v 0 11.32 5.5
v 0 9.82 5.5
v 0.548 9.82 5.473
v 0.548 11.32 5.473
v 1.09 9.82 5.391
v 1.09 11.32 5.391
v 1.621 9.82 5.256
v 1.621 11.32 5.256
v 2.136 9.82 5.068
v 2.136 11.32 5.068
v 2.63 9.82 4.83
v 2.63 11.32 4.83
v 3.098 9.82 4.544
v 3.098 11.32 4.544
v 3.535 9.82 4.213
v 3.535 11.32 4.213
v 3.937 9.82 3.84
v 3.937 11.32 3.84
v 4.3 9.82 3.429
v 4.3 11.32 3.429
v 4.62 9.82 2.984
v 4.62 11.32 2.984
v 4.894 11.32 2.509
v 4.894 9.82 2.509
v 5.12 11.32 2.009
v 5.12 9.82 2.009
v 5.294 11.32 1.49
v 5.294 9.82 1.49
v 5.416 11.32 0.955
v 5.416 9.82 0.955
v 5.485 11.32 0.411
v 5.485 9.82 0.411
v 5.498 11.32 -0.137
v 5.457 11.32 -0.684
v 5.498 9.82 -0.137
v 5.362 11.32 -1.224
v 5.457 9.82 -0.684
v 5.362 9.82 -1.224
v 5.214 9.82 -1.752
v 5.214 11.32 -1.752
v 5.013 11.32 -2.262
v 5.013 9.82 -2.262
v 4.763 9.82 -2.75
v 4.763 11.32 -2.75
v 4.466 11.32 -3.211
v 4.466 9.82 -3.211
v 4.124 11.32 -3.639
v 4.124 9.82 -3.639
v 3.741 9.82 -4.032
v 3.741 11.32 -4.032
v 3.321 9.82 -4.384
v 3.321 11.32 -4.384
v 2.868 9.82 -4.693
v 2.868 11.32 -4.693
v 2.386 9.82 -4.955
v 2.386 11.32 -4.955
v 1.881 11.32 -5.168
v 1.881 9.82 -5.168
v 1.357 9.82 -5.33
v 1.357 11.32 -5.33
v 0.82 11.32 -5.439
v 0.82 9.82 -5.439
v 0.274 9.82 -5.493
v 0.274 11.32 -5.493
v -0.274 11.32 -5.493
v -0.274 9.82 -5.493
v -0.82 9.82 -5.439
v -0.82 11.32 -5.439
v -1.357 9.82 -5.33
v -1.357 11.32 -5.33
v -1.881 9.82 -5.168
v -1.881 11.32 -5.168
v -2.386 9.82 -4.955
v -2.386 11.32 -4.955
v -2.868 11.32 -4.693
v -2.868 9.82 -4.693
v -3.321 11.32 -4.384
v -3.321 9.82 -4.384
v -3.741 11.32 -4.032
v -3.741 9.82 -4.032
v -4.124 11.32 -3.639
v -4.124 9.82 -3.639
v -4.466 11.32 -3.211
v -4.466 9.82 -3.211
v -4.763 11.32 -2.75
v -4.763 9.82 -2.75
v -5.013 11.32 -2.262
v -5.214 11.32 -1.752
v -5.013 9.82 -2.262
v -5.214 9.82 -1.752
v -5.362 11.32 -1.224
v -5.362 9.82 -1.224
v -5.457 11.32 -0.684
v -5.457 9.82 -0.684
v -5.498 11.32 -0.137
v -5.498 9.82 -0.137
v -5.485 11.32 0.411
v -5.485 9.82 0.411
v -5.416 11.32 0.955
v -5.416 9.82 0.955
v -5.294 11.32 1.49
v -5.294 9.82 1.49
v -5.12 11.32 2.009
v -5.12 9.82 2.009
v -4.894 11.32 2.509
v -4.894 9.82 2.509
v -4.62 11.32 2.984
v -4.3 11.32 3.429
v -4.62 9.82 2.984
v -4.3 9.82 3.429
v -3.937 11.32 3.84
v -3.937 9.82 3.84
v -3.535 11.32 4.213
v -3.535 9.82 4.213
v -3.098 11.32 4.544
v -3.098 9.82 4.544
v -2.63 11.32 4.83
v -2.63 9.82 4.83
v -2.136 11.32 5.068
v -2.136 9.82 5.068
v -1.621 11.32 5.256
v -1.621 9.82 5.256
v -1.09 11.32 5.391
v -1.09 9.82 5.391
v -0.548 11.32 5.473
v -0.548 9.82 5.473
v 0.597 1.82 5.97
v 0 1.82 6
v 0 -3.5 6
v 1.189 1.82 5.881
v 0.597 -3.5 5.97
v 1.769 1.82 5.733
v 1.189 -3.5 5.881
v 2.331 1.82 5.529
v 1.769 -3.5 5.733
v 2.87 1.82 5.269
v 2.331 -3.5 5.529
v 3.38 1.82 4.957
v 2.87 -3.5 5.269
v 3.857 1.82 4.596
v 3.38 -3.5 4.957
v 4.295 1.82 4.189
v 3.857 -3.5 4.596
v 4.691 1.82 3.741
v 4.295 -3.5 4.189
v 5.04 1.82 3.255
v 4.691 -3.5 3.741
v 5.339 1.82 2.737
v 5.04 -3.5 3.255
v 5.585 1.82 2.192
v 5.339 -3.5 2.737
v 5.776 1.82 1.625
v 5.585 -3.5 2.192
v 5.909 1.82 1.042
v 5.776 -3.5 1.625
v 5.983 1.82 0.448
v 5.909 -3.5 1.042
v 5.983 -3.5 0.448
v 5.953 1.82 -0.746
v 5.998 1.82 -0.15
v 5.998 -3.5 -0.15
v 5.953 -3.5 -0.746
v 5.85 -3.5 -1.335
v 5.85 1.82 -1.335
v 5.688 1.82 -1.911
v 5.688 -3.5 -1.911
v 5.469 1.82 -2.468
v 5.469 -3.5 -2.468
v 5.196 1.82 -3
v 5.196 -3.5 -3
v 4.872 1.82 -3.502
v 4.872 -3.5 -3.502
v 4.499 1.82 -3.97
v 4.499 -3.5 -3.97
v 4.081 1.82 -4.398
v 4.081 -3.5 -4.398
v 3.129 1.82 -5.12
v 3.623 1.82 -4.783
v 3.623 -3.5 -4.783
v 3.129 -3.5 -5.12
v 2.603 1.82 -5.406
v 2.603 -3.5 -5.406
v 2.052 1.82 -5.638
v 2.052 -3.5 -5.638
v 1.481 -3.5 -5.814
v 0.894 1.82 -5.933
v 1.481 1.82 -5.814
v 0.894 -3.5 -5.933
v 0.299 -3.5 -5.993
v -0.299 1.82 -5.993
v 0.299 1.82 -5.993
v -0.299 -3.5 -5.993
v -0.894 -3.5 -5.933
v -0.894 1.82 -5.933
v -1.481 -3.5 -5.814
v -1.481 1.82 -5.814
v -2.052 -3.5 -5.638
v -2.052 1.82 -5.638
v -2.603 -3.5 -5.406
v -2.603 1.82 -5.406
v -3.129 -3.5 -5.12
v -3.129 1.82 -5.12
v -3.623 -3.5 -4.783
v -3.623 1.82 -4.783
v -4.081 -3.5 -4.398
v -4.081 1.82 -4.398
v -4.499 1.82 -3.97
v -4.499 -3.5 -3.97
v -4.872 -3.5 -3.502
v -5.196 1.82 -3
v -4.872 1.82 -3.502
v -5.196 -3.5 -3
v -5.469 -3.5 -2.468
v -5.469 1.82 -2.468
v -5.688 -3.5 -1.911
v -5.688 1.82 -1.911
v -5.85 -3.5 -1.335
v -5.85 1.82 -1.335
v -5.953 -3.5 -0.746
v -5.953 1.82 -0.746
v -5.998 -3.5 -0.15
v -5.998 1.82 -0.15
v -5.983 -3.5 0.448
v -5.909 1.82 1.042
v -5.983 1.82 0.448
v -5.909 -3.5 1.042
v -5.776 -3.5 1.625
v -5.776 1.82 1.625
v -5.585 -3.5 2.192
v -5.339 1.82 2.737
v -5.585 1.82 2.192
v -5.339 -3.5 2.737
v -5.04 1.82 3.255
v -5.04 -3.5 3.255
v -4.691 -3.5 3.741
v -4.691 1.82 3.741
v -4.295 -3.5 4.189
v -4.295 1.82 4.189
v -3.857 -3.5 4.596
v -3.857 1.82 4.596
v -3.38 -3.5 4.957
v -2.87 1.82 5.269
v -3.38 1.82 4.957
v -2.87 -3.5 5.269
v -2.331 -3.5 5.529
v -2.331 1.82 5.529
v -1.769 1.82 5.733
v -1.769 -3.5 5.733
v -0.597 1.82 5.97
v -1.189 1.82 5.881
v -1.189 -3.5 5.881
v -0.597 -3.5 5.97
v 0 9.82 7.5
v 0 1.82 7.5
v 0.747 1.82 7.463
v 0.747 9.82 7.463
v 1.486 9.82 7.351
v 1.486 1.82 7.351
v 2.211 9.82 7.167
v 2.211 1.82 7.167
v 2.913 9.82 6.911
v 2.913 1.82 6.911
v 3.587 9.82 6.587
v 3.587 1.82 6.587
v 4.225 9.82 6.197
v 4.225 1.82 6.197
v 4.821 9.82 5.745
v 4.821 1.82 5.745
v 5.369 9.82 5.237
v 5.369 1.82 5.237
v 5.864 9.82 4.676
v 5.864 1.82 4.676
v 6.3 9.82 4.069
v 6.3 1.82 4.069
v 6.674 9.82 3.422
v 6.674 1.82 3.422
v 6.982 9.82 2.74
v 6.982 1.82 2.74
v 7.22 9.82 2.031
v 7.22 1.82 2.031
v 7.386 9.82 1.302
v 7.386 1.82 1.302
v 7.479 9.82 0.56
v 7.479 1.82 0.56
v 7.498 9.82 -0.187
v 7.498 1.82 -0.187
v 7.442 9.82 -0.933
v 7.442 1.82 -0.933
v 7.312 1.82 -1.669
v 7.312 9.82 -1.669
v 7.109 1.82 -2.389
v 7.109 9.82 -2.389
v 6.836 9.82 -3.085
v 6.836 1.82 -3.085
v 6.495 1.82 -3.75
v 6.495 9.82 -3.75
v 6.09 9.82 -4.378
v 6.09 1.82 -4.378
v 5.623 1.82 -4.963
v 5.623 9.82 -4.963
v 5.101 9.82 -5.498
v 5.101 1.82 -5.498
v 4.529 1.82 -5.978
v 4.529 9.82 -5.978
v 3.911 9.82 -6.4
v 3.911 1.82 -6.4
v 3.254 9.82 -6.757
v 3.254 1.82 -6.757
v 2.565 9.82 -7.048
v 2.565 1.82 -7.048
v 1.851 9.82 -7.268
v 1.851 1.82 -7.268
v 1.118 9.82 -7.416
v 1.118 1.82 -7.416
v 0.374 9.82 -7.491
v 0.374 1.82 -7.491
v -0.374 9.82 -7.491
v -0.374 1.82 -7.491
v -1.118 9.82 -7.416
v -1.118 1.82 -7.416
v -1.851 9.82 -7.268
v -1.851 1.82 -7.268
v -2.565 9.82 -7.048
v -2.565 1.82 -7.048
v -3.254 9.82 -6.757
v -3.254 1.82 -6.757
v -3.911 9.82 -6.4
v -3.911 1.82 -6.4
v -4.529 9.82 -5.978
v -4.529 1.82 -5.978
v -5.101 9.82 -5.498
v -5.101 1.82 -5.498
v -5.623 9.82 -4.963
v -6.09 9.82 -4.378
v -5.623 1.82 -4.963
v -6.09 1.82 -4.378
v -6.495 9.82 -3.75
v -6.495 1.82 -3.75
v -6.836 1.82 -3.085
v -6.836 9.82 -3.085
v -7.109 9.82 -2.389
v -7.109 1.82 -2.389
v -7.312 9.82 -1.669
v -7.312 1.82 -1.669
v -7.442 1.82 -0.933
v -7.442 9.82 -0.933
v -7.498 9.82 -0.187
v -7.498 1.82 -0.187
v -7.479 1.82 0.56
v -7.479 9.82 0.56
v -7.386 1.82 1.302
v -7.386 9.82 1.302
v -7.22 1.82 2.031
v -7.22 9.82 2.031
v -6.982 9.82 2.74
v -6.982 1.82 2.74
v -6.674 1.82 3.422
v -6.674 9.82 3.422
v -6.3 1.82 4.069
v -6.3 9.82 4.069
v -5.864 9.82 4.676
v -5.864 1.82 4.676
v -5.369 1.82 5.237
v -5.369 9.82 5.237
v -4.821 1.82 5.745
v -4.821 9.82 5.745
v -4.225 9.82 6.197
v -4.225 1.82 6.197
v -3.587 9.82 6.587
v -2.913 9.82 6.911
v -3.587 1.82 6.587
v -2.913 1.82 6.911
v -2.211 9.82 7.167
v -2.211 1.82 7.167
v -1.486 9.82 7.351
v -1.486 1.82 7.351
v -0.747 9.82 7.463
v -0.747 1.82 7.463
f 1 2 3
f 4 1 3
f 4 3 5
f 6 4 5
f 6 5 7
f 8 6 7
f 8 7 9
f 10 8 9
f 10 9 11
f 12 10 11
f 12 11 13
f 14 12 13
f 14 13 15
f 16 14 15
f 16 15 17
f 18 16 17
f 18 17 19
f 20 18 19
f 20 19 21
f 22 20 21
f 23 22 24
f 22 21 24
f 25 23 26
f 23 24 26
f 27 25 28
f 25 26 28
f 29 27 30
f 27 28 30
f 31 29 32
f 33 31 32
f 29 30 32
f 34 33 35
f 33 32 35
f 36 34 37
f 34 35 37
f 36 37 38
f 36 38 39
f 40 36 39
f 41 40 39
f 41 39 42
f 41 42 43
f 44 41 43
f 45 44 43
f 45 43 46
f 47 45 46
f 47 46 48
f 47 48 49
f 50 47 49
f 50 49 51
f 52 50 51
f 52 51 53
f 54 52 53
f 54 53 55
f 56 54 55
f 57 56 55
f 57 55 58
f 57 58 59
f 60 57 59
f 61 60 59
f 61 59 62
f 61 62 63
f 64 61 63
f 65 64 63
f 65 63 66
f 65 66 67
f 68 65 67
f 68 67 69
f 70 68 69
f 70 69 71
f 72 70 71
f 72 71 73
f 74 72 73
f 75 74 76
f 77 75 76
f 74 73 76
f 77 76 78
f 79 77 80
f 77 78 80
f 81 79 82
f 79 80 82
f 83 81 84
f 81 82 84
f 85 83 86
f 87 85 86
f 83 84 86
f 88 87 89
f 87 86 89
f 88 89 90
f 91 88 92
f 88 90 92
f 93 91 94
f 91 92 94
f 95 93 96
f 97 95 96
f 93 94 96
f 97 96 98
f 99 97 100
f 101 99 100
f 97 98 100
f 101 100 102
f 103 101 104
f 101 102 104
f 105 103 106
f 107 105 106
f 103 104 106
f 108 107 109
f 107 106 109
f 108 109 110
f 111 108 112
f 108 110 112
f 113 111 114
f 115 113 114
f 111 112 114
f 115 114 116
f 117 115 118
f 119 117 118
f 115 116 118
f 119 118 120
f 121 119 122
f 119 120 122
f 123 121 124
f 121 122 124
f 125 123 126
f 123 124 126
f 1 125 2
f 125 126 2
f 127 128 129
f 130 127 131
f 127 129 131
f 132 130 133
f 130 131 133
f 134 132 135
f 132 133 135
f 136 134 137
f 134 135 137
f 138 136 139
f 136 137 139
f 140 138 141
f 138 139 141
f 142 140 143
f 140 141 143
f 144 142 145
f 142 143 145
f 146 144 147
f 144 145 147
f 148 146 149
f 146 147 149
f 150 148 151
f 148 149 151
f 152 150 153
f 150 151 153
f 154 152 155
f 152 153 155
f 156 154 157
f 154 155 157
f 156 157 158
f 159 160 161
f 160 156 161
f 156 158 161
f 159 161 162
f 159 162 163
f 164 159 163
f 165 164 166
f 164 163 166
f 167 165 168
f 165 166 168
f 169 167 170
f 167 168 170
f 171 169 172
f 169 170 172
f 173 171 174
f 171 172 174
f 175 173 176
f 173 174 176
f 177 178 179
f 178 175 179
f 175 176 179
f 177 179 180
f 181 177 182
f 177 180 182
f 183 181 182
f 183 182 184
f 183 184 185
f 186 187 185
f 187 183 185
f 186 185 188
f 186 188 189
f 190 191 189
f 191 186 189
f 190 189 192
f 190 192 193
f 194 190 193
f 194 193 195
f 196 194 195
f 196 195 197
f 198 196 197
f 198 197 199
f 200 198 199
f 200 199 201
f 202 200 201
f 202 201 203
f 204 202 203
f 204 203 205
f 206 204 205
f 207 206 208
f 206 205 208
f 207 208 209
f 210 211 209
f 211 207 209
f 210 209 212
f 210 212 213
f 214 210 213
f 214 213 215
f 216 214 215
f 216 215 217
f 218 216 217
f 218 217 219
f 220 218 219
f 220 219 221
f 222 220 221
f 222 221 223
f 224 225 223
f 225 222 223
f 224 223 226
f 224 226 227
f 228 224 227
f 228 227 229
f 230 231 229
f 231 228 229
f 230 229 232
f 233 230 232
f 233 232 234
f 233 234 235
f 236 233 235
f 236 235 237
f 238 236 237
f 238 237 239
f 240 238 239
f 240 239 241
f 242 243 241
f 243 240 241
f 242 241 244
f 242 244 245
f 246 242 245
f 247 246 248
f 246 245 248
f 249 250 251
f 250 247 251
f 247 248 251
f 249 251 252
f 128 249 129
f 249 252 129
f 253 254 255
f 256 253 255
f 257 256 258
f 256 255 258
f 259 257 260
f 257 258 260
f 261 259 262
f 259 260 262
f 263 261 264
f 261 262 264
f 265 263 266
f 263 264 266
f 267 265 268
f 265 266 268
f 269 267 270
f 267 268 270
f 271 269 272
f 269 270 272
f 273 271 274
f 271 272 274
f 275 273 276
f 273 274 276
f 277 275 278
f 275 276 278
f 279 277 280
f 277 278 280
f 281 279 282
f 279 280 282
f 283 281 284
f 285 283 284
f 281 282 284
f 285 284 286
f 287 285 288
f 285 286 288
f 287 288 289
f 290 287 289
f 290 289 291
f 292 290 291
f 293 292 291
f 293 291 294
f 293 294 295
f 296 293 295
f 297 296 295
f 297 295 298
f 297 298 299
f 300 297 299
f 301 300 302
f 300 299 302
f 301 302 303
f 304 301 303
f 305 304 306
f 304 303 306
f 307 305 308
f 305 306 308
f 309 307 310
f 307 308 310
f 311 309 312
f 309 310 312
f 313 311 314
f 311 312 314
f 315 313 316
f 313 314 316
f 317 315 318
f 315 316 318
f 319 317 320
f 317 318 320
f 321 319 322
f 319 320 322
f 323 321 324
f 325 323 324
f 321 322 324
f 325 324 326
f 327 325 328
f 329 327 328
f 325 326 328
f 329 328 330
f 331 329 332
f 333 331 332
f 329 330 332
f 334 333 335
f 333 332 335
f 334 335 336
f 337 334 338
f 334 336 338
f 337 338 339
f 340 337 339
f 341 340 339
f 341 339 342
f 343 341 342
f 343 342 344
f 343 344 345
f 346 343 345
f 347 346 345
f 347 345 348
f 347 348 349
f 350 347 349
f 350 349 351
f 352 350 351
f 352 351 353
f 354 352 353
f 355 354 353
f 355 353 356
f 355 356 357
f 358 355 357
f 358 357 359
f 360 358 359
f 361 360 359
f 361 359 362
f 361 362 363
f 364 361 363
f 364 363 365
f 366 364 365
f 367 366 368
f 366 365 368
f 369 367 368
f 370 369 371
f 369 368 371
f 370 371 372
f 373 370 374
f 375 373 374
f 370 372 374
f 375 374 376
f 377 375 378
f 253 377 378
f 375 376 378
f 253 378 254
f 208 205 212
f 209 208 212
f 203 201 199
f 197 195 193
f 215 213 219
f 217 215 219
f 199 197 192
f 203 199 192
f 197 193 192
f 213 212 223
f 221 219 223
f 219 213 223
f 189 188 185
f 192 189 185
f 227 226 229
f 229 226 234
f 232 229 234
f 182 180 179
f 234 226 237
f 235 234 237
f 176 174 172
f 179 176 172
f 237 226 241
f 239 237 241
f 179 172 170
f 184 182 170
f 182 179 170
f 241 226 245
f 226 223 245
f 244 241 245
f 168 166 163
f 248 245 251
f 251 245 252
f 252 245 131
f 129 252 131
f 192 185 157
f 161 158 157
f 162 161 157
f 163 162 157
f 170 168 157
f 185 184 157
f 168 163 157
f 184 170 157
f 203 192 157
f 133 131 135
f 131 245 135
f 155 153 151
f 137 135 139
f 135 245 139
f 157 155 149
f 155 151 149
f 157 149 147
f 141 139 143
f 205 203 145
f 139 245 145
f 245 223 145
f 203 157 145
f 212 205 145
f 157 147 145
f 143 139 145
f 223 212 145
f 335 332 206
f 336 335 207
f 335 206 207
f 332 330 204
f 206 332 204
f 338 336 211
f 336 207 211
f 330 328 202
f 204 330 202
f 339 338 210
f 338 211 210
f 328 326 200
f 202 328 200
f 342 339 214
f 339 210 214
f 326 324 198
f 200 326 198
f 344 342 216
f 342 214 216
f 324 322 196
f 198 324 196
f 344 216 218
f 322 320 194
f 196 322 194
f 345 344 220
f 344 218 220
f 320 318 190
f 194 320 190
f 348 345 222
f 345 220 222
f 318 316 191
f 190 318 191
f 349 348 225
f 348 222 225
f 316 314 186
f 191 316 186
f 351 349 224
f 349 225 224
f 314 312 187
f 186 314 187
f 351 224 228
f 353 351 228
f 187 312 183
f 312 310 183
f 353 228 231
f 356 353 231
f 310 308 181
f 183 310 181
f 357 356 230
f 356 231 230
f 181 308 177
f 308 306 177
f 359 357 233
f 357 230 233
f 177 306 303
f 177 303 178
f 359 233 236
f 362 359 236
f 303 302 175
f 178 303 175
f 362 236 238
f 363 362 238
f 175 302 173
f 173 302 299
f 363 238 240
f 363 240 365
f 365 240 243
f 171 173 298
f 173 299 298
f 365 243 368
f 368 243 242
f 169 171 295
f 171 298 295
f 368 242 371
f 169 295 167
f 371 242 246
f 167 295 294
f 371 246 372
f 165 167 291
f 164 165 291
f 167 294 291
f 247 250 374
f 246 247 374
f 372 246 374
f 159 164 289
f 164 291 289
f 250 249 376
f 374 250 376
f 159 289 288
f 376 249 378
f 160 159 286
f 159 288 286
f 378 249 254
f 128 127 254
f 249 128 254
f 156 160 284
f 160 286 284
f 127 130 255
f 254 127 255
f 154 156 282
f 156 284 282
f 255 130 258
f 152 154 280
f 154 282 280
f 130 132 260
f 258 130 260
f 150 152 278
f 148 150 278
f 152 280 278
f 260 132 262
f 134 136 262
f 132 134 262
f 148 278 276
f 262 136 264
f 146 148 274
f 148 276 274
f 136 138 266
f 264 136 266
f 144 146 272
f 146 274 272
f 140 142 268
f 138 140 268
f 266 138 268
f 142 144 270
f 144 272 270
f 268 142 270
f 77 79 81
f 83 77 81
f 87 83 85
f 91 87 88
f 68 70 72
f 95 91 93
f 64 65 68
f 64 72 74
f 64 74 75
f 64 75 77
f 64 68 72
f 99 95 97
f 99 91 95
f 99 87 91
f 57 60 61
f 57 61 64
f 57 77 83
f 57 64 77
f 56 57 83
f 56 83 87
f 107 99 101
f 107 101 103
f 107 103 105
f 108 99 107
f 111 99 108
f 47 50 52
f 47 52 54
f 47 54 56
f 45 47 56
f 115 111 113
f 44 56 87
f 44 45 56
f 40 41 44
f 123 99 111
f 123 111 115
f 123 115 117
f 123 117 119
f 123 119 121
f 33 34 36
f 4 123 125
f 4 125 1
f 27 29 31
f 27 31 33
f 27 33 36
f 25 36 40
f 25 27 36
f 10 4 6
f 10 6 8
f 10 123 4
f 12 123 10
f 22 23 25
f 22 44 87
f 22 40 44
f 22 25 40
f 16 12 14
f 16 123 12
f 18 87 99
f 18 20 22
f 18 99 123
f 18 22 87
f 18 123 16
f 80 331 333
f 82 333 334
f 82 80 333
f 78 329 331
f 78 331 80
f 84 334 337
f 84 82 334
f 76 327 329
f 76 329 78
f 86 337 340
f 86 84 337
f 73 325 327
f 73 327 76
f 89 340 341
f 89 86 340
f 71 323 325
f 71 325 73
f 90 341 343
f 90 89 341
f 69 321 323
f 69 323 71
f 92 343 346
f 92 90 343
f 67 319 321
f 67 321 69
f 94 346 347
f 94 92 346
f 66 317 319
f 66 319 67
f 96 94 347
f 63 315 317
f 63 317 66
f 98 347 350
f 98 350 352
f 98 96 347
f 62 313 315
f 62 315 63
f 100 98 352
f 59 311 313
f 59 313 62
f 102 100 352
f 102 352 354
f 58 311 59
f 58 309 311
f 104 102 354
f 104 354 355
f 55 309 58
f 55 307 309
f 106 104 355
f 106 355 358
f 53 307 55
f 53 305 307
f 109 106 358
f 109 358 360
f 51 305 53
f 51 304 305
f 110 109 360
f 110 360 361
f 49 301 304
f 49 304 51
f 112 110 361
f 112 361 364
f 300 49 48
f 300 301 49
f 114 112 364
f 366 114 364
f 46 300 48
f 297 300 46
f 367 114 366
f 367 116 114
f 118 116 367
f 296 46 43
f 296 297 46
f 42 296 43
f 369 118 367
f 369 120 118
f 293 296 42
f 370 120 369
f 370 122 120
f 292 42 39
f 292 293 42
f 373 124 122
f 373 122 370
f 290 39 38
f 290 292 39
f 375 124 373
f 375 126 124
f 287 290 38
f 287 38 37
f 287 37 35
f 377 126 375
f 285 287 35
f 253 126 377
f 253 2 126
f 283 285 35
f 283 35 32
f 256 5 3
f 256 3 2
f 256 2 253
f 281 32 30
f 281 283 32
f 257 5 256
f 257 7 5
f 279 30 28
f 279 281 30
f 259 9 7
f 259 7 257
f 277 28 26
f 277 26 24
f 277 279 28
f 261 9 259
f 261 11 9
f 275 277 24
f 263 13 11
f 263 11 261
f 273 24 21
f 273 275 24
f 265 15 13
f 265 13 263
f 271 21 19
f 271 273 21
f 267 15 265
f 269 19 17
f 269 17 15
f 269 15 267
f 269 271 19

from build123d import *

# Parameters (mm, degrees)
THREAD_START        = -3.5
SKETCH1_R           = 6
THREAD_DEPTH        = 5.33
BODY_START          = 1.82
SKETCH2_R           = 7.5
BODY_DEPTH          = 8
FRONT_START         = 9.81
SKETCH3_R           = 5.5
FRONT_ELEMENT_DEPTH = 1.51


with BuildPart() as part:
    # Sketch1 → Thread (new body)
    with BuildSketch(Plane(origin=(0, 0, 0), x_dir=(1, 0, 0), z_dir=(0, 1, 0)).offset(THREAD_START)):
        with Locations(Location((0, 0, 0), (0, 0, 270))):
            Circle(SKETCH1_R)
    extrude(amount=THREAD_DEPTH)

    # Sketch2 → Body (add)
    with BuildSketch(Plane(origin=(0, 0, 0), x_dir=(1, 0, 0), z_dir=(0, 1, 0)).offset(BODY_START)):
        with Locations(Location((0, 0, 0), (0, 0, 270))):
            Circle(SKETCH2_R)
    extrude(amount=BODY_DEPTH)

    # Sketch3 → Front element (add)
    with BuildSketch(Plane(origin=(0, 0, 0), x_dir=(1, 0, 0), z_dir=(0, 1, 0)).offset(FRONT_START)):
        with Locations(Location((0, 0, 0), (0, 0, 270))):
            Circle(SKETCH3_R)
    extrude(amount=FRONT_ELEMENT_DEPTH)


solid = part.part
